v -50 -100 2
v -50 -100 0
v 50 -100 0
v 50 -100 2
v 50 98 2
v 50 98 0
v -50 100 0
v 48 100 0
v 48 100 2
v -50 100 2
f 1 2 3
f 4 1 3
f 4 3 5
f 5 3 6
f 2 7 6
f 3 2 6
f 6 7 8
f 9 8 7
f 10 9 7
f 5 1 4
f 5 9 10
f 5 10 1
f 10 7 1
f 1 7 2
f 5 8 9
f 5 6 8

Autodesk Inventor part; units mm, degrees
ref_plane "YZ Plane" through (0, 0, 0) normal (1, 0, 0) x (0, 1, 0)
ref_plane "XZ Plane" through (0, 0, 0) normal (0, 1, 0) x (-1, 0, 0)
ref_plane "XY Plane" through (0, 0, 0) normal (0, 0, 1) x (1, 0, 0)
sketch "Sketch1" plane through (0, 0, 0) normal (0, 0, 1) x (1, 0, 0)
  line L0 (-50, -100) -> (50, -100)
  line L1 (50, -100) -> (50, 100)
  line L2 (50, 100) -> (-50, 100)
  line L3 (-50, 100) -> (-50, -100)
  line L4 (-50, -100) -> (50, 100) construction
  line L5 (50, -100) -> (-50, 100) construction
  point P0 (0, 0)
  dimension "d0" = 100
  dimension "d1" = 200
extrude "Plate1" add sketch "Sketch1" along normal blind 2
chamfer "Chamfer1" distance 2 angle 45 1 edges at (50, 100, 1)
sketch "Sketch2" plane through (0, 0, 0) normal (0, 0, -1) x (-1, 0, 0)
  line L0 (-30, 80) -> (170, 80) construction
  line L1 (170, 80) -> (170, 60) construction
  line L2 (170, 60) -> (-30, 60) construction
  line L3 (-30, 60) -> (-30, 80) construction
  line L4 (-48, 100) -> (50, 100) projected
  line L5 (-50, -100) -> (-50, 98) projected
  point P0 (0, 0)
  dimension "d6" = 200
  dimension "d9" = 20
  dimension "d10" = 20
  dimension "d11" = 20
mark "Mark1"
equation "\"d2\" = Thickness"
equation "\"BendReliefWidth\" = Thickness"
equation "\"BendReliefDepth\" = 0.5 * Thickness"
equation "\"CornerReliefSize\" = 4 * Thickness"
equation "\"MinimumRemnant\" = 2 * Thickness"
equation "\"TransitionRadius\" = BendRadius"
equation "\"JacobiRadiusSize\" = BendRadius"
equation "\"GapSize\" = Thickness"
equation "\"Thickness\" = 2"
equation "\"BendRadius\" = 2.75"
properties part number "Sheet Metal (DIN)" material "AISI 304"
